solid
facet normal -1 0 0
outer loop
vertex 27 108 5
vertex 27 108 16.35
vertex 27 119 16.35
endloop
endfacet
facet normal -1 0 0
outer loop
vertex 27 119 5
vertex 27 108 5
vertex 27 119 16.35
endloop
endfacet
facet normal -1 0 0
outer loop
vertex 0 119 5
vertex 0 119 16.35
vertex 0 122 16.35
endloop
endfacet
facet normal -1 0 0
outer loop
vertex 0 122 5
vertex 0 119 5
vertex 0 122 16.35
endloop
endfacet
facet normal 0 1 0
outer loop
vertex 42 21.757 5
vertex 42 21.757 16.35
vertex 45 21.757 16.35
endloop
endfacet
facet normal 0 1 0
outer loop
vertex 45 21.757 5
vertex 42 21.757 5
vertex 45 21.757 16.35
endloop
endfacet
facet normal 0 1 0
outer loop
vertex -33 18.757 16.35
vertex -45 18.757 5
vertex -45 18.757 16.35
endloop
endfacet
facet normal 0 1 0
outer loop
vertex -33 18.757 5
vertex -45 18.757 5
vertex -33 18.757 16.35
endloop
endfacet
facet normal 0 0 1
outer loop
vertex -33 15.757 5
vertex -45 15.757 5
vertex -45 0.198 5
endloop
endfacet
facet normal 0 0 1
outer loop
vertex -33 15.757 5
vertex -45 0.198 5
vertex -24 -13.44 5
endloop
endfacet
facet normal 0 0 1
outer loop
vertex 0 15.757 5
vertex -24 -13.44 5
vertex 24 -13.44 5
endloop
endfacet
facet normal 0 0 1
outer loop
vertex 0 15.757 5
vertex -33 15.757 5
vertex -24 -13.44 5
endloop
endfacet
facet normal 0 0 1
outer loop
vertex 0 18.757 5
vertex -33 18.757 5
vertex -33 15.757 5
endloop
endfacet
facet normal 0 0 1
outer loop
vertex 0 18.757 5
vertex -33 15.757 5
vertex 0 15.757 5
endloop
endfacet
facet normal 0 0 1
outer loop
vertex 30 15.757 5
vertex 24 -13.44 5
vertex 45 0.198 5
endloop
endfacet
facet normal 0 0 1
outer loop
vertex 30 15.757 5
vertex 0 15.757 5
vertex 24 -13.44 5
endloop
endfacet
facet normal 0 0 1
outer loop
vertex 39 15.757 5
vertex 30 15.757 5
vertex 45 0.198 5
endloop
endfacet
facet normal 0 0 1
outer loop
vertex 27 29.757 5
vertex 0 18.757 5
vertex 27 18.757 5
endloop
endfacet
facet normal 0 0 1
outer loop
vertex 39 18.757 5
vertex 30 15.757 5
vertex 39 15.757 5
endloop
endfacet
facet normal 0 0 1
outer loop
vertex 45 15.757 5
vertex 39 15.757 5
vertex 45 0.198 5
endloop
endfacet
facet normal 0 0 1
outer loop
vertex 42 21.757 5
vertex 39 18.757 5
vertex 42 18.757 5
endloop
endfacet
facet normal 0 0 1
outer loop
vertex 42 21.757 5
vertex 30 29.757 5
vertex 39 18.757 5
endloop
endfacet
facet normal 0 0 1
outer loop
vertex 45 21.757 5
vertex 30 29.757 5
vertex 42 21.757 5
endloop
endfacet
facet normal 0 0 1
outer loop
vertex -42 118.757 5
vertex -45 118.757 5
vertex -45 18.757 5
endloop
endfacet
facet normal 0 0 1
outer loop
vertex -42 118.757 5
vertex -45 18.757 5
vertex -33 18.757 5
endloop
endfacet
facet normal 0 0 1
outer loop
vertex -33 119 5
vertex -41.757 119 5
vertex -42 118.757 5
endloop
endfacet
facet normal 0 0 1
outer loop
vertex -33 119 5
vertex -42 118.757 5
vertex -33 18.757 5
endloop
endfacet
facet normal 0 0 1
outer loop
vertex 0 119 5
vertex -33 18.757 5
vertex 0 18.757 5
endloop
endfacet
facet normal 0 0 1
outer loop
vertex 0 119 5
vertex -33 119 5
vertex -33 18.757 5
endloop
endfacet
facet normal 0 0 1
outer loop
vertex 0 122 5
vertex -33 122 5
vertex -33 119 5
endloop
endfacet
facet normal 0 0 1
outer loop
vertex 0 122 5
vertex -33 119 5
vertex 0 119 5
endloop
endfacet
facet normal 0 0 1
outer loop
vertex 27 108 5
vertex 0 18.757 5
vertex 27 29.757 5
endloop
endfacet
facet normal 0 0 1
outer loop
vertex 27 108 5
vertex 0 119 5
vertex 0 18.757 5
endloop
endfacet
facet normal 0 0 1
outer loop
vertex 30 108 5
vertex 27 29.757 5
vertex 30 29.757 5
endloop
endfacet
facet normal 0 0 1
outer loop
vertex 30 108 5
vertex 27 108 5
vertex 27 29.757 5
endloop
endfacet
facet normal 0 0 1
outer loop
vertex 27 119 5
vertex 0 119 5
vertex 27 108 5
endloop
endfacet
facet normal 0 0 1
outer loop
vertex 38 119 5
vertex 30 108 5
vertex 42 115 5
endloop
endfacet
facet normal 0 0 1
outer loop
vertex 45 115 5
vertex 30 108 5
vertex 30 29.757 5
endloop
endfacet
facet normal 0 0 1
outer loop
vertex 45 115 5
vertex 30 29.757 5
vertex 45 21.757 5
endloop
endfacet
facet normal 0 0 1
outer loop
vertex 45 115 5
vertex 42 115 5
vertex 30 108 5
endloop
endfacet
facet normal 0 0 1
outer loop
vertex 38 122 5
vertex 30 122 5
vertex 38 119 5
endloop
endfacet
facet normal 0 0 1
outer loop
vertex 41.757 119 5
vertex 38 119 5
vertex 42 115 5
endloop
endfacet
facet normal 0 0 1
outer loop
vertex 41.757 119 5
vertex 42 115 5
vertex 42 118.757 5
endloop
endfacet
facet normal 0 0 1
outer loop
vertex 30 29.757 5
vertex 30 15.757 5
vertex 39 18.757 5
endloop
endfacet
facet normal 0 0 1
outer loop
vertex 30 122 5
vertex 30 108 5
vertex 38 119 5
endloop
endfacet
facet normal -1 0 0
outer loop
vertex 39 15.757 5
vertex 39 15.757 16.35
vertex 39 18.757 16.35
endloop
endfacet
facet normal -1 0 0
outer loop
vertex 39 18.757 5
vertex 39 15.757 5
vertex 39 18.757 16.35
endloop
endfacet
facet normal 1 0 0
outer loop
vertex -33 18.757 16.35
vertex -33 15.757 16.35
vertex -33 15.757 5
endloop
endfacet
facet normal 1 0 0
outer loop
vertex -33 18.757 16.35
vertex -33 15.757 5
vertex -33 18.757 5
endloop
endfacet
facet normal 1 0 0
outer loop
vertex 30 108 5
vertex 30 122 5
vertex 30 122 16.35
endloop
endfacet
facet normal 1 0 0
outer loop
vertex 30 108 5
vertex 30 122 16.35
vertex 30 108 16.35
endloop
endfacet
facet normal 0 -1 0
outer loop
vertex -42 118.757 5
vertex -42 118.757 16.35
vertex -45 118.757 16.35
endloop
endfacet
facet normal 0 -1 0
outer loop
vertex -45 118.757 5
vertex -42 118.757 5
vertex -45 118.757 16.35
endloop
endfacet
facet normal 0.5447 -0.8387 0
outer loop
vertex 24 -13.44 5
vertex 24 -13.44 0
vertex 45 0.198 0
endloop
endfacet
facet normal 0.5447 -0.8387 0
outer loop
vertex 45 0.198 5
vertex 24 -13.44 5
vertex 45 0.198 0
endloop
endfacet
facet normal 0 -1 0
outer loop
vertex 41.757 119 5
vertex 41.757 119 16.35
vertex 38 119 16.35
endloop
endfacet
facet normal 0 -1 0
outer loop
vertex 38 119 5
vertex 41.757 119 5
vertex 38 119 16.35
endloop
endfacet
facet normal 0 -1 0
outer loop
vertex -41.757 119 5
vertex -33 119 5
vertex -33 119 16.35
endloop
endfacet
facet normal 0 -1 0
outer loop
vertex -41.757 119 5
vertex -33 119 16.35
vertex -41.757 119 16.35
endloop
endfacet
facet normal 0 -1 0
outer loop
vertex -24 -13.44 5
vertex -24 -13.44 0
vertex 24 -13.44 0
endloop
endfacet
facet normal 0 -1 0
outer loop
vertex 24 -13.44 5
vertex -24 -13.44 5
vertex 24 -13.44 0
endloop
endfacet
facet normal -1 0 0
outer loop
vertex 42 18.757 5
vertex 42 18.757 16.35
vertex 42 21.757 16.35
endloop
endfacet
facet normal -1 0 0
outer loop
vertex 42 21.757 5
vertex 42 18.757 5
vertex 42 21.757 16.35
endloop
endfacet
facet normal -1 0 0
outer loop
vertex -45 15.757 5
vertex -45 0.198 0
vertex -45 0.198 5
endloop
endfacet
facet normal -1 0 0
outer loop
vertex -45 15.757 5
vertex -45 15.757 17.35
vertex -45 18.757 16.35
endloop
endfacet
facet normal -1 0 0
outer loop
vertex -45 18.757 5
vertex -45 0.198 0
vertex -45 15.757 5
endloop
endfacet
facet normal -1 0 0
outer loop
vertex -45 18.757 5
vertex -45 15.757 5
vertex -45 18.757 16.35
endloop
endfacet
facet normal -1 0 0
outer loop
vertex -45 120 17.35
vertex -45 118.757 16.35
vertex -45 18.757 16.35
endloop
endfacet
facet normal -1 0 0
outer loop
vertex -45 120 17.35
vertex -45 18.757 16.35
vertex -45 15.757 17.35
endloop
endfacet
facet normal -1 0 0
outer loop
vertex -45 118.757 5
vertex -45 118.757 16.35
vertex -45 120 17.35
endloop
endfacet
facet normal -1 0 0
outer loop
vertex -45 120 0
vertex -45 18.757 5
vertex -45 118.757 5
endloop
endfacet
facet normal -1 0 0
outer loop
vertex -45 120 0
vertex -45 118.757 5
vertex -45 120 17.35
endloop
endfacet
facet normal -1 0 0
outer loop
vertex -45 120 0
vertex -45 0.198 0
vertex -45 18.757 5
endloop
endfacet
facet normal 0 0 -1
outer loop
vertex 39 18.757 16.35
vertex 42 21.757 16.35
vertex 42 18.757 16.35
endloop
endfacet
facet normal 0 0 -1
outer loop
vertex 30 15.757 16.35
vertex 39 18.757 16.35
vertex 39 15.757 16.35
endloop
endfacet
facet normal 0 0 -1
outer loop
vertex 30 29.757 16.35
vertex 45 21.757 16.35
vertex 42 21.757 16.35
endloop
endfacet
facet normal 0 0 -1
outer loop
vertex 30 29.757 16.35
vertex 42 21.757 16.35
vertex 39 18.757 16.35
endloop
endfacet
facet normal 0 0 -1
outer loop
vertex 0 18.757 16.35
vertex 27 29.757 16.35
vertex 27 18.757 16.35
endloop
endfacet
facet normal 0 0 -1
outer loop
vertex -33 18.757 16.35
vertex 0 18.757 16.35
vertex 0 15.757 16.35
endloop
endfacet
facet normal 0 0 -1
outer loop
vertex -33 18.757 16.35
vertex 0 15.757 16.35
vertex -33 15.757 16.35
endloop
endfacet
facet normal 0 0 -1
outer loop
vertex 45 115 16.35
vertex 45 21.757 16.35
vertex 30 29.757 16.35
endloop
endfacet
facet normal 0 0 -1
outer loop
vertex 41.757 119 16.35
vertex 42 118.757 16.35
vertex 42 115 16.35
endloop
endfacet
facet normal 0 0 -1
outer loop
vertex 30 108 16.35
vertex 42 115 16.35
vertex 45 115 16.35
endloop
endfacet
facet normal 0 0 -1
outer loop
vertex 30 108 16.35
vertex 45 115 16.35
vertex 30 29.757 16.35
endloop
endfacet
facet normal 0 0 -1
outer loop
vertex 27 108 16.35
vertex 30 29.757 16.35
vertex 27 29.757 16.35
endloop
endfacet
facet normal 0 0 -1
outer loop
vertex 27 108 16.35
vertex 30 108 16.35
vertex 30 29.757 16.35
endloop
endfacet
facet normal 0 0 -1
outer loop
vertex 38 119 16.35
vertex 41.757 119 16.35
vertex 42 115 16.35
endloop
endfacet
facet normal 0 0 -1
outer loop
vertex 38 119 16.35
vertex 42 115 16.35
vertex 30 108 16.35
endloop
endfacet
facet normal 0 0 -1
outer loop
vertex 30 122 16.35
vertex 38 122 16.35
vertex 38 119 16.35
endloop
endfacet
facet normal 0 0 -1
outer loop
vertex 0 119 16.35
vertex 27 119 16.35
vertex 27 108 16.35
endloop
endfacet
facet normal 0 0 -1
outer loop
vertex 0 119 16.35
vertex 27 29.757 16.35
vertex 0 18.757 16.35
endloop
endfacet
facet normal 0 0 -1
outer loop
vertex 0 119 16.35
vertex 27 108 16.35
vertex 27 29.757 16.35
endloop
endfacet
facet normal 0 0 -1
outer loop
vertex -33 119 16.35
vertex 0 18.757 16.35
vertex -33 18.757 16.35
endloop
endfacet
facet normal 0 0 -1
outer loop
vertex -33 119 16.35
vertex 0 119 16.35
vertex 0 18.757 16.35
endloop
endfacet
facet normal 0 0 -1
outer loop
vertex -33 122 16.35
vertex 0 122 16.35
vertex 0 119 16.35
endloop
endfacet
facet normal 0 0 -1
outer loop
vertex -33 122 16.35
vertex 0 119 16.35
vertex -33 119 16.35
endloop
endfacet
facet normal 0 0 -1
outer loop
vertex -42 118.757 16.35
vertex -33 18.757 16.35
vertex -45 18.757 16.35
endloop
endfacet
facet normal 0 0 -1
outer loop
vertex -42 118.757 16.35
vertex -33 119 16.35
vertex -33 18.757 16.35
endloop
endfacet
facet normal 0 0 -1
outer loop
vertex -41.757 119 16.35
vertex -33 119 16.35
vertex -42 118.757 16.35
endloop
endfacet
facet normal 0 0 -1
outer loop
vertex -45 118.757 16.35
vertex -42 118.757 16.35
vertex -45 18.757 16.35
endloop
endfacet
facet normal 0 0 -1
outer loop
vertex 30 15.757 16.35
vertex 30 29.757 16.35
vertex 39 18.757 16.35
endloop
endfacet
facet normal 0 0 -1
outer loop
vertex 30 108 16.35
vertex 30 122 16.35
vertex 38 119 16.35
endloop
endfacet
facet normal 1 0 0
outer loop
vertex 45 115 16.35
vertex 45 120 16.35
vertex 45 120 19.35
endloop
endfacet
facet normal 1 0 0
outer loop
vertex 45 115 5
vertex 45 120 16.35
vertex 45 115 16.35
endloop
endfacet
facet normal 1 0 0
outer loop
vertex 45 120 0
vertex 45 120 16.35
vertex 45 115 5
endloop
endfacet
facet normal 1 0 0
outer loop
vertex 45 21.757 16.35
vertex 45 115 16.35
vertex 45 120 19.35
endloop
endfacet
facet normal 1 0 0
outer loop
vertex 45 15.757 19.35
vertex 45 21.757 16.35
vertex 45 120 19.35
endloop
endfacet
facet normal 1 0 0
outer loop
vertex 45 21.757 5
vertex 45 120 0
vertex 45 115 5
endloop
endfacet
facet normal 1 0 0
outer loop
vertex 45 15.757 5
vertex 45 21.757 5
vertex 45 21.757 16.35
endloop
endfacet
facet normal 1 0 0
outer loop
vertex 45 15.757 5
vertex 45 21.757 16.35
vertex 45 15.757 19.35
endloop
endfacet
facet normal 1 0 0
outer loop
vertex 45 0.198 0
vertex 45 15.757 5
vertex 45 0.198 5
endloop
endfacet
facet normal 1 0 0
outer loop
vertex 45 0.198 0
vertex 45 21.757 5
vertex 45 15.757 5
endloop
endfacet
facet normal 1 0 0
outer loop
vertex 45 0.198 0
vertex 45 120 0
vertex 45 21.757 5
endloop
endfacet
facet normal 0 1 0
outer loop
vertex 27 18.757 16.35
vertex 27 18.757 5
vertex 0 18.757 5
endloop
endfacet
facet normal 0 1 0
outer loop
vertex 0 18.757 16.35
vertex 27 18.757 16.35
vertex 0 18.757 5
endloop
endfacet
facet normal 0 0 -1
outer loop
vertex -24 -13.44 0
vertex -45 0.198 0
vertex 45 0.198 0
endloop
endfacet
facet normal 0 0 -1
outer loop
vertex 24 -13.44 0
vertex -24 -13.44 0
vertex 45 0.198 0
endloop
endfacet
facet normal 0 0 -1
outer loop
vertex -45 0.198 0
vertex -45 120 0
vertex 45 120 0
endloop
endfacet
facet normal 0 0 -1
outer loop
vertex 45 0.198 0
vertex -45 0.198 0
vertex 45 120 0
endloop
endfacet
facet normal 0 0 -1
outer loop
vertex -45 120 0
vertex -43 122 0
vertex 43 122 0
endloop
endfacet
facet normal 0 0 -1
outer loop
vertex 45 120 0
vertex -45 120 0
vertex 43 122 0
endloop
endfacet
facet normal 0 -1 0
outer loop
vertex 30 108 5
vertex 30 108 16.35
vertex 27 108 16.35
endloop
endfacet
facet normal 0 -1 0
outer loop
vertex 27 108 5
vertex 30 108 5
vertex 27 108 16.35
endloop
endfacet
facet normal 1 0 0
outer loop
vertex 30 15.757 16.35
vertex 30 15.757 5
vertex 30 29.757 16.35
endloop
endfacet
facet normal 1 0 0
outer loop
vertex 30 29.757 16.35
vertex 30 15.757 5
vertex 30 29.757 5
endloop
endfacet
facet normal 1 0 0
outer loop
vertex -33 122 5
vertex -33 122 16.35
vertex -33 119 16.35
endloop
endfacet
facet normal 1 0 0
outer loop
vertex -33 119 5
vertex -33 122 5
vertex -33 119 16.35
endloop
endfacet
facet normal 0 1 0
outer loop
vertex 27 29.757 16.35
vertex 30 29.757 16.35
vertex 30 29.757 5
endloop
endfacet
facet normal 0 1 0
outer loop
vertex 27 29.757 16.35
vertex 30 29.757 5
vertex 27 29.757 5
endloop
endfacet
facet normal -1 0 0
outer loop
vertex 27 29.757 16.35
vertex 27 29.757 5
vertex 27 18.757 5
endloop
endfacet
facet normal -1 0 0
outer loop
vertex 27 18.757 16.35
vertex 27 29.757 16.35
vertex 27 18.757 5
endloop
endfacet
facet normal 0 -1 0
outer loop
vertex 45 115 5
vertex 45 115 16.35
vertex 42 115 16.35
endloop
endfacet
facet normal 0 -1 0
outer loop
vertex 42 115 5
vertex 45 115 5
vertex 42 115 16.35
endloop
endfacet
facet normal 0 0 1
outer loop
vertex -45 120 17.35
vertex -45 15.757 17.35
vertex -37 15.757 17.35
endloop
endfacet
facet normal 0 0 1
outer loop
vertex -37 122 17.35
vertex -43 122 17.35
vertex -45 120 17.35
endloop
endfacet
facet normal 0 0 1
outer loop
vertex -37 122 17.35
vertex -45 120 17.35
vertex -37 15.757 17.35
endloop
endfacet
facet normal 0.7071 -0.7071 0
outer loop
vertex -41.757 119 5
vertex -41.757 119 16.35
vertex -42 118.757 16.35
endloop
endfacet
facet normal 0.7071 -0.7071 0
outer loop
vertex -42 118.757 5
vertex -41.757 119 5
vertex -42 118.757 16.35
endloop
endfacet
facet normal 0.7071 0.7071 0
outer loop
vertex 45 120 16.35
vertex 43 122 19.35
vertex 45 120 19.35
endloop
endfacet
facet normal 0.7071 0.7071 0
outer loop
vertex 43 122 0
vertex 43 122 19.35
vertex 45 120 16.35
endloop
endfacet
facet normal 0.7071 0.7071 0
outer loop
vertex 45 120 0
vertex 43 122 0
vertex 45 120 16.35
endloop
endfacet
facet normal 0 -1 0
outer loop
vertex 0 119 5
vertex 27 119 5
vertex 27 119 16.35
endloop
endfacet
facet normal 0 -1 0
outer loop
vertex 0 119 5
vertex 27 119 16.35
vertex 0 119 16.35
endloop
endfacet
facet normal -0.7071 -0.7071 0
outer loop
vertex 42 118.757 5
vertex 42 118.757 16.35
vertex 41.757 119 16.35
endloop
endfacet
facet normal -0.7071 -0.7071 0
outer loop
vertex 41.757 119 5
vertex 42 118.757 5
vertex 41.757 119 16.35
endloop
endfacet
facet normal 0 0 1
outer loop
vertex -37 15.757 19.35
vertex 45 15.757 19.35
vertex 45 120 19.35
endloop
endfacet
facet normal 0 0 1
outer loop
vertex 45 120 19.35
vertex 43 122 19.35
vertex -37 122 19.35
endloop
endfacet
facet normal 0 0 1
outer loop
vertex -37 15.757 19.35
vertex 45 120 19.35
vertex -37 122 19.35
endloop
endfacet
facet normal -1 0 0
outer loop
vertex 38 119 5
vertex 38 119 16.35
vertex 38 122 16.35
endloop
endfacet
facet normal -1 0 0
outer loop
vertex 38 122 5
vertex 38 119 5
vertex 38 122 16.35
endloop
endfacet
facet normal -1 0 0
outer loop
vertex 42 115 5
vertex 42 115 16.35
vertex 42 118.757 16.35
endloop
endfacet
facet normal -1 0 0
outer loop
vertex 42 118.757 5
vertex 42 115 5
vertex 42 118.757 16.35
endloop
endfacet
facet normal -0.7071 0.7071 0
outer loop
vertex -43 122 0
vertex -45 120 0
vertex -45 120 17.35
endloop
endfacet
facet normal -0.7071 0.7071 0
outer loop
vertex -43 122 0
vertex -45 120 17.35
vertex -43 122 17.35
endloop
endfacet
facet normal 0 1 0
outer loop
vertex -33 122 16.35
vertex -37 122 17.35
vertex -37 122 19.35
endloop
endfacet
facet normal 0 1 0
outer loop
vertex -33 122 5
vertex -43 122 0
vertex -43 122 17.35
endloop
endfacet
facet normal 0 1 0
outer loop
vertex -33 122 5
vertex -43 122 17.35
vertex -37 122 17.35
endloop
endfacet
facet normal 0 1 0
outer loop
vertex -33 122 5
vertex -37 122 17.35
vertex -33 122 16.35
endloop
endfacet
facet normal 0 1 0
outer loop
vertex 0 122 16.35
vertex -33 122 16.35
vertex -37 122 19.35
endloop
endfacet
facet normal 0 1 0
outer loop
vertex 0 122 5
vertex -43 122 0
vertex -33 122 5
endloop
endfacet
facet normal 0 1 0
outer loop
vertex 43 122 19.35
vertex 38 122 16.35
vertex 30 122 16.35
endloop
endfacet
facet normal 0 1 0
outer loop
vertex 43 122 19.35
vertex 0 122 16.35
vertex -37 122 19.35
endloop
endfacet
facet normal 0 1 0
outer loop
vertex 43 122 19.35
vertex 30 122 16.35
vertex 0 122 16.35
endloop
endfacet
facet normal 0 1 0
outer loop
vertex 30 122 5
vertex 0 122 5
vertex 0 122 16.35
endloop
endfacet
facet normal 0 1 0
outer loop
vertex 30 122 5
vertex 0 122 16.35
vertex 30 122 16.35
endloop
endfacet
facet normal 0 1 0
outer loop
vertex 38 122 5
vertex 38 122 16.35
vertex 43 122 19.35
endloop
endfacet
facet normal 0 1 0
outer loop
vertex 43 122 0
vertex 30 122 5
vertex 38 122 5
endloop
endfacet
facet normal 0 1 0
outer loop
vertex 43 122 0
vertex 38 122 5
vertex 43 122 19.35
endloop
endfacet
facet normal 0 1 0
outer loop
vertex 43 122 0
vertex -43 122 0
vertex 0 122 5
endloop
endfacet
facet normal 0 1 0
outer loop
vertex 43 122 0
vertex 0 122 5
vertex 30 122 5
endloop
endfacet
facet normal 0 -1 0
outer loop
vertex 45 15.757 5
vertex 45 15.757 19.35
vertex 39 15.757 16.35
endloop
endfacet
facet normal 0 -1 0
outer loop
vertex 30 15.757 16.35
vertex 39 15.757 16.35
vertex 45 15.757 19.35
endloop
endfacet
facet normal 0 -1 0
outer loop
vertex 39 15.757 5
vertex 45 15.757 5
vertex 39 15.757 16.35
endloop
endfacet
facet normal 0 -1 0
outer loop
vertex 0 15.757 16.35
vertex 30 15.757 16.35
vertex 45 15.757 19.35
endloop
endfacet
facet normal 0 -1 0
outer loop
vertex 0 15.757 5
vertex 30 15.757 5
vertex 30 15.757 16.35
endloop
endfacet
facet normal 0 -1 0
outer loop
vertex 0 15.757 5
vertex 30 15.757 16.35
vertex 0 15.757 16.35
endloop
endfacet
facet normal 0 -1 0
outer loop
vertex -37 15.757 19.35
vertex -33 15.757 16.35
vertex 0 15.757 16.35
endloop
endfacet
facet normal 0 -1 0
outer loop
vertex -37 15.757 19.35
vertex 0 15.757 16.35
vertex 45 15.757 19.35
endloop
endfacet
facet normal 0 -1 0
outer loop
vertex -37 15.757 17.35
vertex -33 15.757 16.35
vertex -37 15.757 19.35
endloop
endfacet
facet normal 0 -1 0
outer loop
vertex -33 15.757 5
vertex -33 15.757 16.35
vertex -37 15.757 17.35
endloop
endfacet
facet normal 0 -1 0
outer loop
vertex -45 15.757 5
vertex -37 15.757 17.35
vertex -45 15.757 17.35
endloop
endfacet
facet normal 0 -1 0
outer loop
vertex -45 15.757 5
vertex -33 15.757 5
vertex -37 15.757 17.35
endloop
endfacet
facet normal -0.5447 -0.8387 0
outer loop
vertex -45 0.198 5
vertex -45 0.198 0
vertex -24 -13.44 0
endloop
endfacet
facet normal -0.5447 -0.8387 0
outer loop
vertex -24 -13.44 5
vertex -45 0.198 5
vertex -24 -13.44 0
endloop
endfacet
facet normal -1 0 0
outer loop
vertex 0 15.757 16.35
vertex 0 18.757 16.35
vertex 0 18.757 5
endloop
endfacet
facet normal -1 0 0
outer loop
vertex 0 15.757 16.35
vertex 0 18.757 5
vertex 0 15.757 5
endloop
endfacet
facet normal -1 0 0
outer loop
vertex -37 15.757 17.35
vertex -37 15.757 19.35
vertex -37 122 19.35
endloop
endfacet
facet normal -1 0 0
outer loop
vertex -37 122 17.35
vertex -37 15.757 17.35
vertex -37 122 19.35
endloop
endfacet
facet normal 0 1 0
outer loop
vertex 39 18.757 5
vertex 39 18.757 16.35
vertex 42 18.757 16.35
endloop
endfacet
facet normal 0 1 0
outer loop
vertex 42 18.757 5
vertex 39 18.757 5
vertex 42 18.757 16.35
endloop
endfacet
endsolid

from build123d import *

# Parameters (mm, degrees)
BOSS_EXTRUDE1_DEPTH = 5
CHAMFER1_SIZE       = 2
SKETCH4_W           = 12
SKETCH4_H           = 3
BOSS_EXTRUDE2_DEPTH = 11.35
BOSS_EXTRUDE3_DEPTH = 3
BOSS_EXTRUDE4_DEPTH = 11.35
CHAMFER2_START      = 116.672618896
CHAMFER2_OUTLINE_W  = 5
CHAMFER2_OUTLINE_H  = 4.65
CHAMFER2_DEPTH      = 2.327381104
CUT_EXTRUDE2_DEPTH  = 2


with BuildPart() as part:
    # Sketch2 → Boss-Extrude1 (new body)
    with BuildSketch(Plane.XY):
        Polygon((-45, 122), (-45, 0.197559457), (-24, -13.44), (24, -13.44), (45, 0.197559457), (45, 122), align=None)
    extrude(amount=BOSS_EXTRUDE1_DEPTH)

    # Chamfer1
    chamfer1_edges = [part.edges().sort_by_distance(p)[0] for p in [
        (45, 122, 2.5),
        (-45, 122, 2.5),
    ]]
    chamfer(chamfer1_edges, length=CHAMFER1_SIZE)

    # Sketch4 → Boss-Extrude2 (add)
    with BuildSketch(Plane.XY.offset(5)):
        Polygon((-45, 120), (-43, 122), (-33, 122), (-33, 119), (-41.757359313, 119), (-42, 118.757359313), (-45, 118.757359313), align=None)
        with Locations((-39, 17.257359313)):
            Rectangle(SKETCH4_W, SKETCH4_H)
        Polygon((0, 122), (30, 122), (30, 108), (27, 108), (27, 119), (0, 119), align=None)
        Polygon((0, 15.757359313), (30, 15.757359313), (30, 29.757359313), (27, 29.757359313), (27, 18.757359313), (0, 18.757359313), align=None)
    extrude(amount=BOSS_EXTRUDE2_DEPTH)

    # Sketch5 → Boss-Extrude3 (add)
    with BuildSketch(Plane.XY.offset(16.35)):
        Polygon((45, 15.757359313), (-45, 15.757359313), (-45, 120), (-43, 122), (45, 122), align=None)
    extrude(amount=BOSS_EXTRUDE3_DEPTH)

    # Sketch6 → Boss-Extrude4 (add)
    with BuildSketch(Plane.XY.offset(5)):
        Polygon((38, 122), (43, 122), (45, 120), (45, 115), (42, 115), (42, 118.757359313), (41.757359313, 119), (38, 119), align=None)
        Polygon((45, 15.757359313), (39, 15.757359313), (39, 18.757359313), (42, 18.757359313), (42, 21.757359313), (45, 21.757359313), align=None)
    extrude(amount=BOSS_EXTRUDE4_DEPTH)

    # Chamfer2: read off the stored shape, not the designer's step
    # Chamfer2 outline → Chamfer2 (cut)
    with BuildSketch(Plane(origin=(0, 0, 0), x_dir=(0.70710678118655, -0.707106781186545, 0), z_dir=(0.707106781186545, 0.70710678118655, 0)).offset(CHAMFER2_START)):
        with Locations((-54.5, -18.675)):
            Rectangle(CHAMFER2_OUTLINE_W, CHAMFER2_OUTLINE_H)
    extrude(amount=CHAMFER2_DEPTH, mode=Mode.SUBTRACT)

    # Sketch8 → Cut-Extrude2 (cut)
    with BuildSketch(Plane.XY.offset(19.35)):
        Polygon((-45, 15.757359313), (-37, 15.757359313), (-37, 122), (-43, 122), (-45, 120), align=None)
    extrude(amount=-CUT_EXTRUDE2_DEPTH, mode=Mode.SUBTRACT)


solid = part.part
